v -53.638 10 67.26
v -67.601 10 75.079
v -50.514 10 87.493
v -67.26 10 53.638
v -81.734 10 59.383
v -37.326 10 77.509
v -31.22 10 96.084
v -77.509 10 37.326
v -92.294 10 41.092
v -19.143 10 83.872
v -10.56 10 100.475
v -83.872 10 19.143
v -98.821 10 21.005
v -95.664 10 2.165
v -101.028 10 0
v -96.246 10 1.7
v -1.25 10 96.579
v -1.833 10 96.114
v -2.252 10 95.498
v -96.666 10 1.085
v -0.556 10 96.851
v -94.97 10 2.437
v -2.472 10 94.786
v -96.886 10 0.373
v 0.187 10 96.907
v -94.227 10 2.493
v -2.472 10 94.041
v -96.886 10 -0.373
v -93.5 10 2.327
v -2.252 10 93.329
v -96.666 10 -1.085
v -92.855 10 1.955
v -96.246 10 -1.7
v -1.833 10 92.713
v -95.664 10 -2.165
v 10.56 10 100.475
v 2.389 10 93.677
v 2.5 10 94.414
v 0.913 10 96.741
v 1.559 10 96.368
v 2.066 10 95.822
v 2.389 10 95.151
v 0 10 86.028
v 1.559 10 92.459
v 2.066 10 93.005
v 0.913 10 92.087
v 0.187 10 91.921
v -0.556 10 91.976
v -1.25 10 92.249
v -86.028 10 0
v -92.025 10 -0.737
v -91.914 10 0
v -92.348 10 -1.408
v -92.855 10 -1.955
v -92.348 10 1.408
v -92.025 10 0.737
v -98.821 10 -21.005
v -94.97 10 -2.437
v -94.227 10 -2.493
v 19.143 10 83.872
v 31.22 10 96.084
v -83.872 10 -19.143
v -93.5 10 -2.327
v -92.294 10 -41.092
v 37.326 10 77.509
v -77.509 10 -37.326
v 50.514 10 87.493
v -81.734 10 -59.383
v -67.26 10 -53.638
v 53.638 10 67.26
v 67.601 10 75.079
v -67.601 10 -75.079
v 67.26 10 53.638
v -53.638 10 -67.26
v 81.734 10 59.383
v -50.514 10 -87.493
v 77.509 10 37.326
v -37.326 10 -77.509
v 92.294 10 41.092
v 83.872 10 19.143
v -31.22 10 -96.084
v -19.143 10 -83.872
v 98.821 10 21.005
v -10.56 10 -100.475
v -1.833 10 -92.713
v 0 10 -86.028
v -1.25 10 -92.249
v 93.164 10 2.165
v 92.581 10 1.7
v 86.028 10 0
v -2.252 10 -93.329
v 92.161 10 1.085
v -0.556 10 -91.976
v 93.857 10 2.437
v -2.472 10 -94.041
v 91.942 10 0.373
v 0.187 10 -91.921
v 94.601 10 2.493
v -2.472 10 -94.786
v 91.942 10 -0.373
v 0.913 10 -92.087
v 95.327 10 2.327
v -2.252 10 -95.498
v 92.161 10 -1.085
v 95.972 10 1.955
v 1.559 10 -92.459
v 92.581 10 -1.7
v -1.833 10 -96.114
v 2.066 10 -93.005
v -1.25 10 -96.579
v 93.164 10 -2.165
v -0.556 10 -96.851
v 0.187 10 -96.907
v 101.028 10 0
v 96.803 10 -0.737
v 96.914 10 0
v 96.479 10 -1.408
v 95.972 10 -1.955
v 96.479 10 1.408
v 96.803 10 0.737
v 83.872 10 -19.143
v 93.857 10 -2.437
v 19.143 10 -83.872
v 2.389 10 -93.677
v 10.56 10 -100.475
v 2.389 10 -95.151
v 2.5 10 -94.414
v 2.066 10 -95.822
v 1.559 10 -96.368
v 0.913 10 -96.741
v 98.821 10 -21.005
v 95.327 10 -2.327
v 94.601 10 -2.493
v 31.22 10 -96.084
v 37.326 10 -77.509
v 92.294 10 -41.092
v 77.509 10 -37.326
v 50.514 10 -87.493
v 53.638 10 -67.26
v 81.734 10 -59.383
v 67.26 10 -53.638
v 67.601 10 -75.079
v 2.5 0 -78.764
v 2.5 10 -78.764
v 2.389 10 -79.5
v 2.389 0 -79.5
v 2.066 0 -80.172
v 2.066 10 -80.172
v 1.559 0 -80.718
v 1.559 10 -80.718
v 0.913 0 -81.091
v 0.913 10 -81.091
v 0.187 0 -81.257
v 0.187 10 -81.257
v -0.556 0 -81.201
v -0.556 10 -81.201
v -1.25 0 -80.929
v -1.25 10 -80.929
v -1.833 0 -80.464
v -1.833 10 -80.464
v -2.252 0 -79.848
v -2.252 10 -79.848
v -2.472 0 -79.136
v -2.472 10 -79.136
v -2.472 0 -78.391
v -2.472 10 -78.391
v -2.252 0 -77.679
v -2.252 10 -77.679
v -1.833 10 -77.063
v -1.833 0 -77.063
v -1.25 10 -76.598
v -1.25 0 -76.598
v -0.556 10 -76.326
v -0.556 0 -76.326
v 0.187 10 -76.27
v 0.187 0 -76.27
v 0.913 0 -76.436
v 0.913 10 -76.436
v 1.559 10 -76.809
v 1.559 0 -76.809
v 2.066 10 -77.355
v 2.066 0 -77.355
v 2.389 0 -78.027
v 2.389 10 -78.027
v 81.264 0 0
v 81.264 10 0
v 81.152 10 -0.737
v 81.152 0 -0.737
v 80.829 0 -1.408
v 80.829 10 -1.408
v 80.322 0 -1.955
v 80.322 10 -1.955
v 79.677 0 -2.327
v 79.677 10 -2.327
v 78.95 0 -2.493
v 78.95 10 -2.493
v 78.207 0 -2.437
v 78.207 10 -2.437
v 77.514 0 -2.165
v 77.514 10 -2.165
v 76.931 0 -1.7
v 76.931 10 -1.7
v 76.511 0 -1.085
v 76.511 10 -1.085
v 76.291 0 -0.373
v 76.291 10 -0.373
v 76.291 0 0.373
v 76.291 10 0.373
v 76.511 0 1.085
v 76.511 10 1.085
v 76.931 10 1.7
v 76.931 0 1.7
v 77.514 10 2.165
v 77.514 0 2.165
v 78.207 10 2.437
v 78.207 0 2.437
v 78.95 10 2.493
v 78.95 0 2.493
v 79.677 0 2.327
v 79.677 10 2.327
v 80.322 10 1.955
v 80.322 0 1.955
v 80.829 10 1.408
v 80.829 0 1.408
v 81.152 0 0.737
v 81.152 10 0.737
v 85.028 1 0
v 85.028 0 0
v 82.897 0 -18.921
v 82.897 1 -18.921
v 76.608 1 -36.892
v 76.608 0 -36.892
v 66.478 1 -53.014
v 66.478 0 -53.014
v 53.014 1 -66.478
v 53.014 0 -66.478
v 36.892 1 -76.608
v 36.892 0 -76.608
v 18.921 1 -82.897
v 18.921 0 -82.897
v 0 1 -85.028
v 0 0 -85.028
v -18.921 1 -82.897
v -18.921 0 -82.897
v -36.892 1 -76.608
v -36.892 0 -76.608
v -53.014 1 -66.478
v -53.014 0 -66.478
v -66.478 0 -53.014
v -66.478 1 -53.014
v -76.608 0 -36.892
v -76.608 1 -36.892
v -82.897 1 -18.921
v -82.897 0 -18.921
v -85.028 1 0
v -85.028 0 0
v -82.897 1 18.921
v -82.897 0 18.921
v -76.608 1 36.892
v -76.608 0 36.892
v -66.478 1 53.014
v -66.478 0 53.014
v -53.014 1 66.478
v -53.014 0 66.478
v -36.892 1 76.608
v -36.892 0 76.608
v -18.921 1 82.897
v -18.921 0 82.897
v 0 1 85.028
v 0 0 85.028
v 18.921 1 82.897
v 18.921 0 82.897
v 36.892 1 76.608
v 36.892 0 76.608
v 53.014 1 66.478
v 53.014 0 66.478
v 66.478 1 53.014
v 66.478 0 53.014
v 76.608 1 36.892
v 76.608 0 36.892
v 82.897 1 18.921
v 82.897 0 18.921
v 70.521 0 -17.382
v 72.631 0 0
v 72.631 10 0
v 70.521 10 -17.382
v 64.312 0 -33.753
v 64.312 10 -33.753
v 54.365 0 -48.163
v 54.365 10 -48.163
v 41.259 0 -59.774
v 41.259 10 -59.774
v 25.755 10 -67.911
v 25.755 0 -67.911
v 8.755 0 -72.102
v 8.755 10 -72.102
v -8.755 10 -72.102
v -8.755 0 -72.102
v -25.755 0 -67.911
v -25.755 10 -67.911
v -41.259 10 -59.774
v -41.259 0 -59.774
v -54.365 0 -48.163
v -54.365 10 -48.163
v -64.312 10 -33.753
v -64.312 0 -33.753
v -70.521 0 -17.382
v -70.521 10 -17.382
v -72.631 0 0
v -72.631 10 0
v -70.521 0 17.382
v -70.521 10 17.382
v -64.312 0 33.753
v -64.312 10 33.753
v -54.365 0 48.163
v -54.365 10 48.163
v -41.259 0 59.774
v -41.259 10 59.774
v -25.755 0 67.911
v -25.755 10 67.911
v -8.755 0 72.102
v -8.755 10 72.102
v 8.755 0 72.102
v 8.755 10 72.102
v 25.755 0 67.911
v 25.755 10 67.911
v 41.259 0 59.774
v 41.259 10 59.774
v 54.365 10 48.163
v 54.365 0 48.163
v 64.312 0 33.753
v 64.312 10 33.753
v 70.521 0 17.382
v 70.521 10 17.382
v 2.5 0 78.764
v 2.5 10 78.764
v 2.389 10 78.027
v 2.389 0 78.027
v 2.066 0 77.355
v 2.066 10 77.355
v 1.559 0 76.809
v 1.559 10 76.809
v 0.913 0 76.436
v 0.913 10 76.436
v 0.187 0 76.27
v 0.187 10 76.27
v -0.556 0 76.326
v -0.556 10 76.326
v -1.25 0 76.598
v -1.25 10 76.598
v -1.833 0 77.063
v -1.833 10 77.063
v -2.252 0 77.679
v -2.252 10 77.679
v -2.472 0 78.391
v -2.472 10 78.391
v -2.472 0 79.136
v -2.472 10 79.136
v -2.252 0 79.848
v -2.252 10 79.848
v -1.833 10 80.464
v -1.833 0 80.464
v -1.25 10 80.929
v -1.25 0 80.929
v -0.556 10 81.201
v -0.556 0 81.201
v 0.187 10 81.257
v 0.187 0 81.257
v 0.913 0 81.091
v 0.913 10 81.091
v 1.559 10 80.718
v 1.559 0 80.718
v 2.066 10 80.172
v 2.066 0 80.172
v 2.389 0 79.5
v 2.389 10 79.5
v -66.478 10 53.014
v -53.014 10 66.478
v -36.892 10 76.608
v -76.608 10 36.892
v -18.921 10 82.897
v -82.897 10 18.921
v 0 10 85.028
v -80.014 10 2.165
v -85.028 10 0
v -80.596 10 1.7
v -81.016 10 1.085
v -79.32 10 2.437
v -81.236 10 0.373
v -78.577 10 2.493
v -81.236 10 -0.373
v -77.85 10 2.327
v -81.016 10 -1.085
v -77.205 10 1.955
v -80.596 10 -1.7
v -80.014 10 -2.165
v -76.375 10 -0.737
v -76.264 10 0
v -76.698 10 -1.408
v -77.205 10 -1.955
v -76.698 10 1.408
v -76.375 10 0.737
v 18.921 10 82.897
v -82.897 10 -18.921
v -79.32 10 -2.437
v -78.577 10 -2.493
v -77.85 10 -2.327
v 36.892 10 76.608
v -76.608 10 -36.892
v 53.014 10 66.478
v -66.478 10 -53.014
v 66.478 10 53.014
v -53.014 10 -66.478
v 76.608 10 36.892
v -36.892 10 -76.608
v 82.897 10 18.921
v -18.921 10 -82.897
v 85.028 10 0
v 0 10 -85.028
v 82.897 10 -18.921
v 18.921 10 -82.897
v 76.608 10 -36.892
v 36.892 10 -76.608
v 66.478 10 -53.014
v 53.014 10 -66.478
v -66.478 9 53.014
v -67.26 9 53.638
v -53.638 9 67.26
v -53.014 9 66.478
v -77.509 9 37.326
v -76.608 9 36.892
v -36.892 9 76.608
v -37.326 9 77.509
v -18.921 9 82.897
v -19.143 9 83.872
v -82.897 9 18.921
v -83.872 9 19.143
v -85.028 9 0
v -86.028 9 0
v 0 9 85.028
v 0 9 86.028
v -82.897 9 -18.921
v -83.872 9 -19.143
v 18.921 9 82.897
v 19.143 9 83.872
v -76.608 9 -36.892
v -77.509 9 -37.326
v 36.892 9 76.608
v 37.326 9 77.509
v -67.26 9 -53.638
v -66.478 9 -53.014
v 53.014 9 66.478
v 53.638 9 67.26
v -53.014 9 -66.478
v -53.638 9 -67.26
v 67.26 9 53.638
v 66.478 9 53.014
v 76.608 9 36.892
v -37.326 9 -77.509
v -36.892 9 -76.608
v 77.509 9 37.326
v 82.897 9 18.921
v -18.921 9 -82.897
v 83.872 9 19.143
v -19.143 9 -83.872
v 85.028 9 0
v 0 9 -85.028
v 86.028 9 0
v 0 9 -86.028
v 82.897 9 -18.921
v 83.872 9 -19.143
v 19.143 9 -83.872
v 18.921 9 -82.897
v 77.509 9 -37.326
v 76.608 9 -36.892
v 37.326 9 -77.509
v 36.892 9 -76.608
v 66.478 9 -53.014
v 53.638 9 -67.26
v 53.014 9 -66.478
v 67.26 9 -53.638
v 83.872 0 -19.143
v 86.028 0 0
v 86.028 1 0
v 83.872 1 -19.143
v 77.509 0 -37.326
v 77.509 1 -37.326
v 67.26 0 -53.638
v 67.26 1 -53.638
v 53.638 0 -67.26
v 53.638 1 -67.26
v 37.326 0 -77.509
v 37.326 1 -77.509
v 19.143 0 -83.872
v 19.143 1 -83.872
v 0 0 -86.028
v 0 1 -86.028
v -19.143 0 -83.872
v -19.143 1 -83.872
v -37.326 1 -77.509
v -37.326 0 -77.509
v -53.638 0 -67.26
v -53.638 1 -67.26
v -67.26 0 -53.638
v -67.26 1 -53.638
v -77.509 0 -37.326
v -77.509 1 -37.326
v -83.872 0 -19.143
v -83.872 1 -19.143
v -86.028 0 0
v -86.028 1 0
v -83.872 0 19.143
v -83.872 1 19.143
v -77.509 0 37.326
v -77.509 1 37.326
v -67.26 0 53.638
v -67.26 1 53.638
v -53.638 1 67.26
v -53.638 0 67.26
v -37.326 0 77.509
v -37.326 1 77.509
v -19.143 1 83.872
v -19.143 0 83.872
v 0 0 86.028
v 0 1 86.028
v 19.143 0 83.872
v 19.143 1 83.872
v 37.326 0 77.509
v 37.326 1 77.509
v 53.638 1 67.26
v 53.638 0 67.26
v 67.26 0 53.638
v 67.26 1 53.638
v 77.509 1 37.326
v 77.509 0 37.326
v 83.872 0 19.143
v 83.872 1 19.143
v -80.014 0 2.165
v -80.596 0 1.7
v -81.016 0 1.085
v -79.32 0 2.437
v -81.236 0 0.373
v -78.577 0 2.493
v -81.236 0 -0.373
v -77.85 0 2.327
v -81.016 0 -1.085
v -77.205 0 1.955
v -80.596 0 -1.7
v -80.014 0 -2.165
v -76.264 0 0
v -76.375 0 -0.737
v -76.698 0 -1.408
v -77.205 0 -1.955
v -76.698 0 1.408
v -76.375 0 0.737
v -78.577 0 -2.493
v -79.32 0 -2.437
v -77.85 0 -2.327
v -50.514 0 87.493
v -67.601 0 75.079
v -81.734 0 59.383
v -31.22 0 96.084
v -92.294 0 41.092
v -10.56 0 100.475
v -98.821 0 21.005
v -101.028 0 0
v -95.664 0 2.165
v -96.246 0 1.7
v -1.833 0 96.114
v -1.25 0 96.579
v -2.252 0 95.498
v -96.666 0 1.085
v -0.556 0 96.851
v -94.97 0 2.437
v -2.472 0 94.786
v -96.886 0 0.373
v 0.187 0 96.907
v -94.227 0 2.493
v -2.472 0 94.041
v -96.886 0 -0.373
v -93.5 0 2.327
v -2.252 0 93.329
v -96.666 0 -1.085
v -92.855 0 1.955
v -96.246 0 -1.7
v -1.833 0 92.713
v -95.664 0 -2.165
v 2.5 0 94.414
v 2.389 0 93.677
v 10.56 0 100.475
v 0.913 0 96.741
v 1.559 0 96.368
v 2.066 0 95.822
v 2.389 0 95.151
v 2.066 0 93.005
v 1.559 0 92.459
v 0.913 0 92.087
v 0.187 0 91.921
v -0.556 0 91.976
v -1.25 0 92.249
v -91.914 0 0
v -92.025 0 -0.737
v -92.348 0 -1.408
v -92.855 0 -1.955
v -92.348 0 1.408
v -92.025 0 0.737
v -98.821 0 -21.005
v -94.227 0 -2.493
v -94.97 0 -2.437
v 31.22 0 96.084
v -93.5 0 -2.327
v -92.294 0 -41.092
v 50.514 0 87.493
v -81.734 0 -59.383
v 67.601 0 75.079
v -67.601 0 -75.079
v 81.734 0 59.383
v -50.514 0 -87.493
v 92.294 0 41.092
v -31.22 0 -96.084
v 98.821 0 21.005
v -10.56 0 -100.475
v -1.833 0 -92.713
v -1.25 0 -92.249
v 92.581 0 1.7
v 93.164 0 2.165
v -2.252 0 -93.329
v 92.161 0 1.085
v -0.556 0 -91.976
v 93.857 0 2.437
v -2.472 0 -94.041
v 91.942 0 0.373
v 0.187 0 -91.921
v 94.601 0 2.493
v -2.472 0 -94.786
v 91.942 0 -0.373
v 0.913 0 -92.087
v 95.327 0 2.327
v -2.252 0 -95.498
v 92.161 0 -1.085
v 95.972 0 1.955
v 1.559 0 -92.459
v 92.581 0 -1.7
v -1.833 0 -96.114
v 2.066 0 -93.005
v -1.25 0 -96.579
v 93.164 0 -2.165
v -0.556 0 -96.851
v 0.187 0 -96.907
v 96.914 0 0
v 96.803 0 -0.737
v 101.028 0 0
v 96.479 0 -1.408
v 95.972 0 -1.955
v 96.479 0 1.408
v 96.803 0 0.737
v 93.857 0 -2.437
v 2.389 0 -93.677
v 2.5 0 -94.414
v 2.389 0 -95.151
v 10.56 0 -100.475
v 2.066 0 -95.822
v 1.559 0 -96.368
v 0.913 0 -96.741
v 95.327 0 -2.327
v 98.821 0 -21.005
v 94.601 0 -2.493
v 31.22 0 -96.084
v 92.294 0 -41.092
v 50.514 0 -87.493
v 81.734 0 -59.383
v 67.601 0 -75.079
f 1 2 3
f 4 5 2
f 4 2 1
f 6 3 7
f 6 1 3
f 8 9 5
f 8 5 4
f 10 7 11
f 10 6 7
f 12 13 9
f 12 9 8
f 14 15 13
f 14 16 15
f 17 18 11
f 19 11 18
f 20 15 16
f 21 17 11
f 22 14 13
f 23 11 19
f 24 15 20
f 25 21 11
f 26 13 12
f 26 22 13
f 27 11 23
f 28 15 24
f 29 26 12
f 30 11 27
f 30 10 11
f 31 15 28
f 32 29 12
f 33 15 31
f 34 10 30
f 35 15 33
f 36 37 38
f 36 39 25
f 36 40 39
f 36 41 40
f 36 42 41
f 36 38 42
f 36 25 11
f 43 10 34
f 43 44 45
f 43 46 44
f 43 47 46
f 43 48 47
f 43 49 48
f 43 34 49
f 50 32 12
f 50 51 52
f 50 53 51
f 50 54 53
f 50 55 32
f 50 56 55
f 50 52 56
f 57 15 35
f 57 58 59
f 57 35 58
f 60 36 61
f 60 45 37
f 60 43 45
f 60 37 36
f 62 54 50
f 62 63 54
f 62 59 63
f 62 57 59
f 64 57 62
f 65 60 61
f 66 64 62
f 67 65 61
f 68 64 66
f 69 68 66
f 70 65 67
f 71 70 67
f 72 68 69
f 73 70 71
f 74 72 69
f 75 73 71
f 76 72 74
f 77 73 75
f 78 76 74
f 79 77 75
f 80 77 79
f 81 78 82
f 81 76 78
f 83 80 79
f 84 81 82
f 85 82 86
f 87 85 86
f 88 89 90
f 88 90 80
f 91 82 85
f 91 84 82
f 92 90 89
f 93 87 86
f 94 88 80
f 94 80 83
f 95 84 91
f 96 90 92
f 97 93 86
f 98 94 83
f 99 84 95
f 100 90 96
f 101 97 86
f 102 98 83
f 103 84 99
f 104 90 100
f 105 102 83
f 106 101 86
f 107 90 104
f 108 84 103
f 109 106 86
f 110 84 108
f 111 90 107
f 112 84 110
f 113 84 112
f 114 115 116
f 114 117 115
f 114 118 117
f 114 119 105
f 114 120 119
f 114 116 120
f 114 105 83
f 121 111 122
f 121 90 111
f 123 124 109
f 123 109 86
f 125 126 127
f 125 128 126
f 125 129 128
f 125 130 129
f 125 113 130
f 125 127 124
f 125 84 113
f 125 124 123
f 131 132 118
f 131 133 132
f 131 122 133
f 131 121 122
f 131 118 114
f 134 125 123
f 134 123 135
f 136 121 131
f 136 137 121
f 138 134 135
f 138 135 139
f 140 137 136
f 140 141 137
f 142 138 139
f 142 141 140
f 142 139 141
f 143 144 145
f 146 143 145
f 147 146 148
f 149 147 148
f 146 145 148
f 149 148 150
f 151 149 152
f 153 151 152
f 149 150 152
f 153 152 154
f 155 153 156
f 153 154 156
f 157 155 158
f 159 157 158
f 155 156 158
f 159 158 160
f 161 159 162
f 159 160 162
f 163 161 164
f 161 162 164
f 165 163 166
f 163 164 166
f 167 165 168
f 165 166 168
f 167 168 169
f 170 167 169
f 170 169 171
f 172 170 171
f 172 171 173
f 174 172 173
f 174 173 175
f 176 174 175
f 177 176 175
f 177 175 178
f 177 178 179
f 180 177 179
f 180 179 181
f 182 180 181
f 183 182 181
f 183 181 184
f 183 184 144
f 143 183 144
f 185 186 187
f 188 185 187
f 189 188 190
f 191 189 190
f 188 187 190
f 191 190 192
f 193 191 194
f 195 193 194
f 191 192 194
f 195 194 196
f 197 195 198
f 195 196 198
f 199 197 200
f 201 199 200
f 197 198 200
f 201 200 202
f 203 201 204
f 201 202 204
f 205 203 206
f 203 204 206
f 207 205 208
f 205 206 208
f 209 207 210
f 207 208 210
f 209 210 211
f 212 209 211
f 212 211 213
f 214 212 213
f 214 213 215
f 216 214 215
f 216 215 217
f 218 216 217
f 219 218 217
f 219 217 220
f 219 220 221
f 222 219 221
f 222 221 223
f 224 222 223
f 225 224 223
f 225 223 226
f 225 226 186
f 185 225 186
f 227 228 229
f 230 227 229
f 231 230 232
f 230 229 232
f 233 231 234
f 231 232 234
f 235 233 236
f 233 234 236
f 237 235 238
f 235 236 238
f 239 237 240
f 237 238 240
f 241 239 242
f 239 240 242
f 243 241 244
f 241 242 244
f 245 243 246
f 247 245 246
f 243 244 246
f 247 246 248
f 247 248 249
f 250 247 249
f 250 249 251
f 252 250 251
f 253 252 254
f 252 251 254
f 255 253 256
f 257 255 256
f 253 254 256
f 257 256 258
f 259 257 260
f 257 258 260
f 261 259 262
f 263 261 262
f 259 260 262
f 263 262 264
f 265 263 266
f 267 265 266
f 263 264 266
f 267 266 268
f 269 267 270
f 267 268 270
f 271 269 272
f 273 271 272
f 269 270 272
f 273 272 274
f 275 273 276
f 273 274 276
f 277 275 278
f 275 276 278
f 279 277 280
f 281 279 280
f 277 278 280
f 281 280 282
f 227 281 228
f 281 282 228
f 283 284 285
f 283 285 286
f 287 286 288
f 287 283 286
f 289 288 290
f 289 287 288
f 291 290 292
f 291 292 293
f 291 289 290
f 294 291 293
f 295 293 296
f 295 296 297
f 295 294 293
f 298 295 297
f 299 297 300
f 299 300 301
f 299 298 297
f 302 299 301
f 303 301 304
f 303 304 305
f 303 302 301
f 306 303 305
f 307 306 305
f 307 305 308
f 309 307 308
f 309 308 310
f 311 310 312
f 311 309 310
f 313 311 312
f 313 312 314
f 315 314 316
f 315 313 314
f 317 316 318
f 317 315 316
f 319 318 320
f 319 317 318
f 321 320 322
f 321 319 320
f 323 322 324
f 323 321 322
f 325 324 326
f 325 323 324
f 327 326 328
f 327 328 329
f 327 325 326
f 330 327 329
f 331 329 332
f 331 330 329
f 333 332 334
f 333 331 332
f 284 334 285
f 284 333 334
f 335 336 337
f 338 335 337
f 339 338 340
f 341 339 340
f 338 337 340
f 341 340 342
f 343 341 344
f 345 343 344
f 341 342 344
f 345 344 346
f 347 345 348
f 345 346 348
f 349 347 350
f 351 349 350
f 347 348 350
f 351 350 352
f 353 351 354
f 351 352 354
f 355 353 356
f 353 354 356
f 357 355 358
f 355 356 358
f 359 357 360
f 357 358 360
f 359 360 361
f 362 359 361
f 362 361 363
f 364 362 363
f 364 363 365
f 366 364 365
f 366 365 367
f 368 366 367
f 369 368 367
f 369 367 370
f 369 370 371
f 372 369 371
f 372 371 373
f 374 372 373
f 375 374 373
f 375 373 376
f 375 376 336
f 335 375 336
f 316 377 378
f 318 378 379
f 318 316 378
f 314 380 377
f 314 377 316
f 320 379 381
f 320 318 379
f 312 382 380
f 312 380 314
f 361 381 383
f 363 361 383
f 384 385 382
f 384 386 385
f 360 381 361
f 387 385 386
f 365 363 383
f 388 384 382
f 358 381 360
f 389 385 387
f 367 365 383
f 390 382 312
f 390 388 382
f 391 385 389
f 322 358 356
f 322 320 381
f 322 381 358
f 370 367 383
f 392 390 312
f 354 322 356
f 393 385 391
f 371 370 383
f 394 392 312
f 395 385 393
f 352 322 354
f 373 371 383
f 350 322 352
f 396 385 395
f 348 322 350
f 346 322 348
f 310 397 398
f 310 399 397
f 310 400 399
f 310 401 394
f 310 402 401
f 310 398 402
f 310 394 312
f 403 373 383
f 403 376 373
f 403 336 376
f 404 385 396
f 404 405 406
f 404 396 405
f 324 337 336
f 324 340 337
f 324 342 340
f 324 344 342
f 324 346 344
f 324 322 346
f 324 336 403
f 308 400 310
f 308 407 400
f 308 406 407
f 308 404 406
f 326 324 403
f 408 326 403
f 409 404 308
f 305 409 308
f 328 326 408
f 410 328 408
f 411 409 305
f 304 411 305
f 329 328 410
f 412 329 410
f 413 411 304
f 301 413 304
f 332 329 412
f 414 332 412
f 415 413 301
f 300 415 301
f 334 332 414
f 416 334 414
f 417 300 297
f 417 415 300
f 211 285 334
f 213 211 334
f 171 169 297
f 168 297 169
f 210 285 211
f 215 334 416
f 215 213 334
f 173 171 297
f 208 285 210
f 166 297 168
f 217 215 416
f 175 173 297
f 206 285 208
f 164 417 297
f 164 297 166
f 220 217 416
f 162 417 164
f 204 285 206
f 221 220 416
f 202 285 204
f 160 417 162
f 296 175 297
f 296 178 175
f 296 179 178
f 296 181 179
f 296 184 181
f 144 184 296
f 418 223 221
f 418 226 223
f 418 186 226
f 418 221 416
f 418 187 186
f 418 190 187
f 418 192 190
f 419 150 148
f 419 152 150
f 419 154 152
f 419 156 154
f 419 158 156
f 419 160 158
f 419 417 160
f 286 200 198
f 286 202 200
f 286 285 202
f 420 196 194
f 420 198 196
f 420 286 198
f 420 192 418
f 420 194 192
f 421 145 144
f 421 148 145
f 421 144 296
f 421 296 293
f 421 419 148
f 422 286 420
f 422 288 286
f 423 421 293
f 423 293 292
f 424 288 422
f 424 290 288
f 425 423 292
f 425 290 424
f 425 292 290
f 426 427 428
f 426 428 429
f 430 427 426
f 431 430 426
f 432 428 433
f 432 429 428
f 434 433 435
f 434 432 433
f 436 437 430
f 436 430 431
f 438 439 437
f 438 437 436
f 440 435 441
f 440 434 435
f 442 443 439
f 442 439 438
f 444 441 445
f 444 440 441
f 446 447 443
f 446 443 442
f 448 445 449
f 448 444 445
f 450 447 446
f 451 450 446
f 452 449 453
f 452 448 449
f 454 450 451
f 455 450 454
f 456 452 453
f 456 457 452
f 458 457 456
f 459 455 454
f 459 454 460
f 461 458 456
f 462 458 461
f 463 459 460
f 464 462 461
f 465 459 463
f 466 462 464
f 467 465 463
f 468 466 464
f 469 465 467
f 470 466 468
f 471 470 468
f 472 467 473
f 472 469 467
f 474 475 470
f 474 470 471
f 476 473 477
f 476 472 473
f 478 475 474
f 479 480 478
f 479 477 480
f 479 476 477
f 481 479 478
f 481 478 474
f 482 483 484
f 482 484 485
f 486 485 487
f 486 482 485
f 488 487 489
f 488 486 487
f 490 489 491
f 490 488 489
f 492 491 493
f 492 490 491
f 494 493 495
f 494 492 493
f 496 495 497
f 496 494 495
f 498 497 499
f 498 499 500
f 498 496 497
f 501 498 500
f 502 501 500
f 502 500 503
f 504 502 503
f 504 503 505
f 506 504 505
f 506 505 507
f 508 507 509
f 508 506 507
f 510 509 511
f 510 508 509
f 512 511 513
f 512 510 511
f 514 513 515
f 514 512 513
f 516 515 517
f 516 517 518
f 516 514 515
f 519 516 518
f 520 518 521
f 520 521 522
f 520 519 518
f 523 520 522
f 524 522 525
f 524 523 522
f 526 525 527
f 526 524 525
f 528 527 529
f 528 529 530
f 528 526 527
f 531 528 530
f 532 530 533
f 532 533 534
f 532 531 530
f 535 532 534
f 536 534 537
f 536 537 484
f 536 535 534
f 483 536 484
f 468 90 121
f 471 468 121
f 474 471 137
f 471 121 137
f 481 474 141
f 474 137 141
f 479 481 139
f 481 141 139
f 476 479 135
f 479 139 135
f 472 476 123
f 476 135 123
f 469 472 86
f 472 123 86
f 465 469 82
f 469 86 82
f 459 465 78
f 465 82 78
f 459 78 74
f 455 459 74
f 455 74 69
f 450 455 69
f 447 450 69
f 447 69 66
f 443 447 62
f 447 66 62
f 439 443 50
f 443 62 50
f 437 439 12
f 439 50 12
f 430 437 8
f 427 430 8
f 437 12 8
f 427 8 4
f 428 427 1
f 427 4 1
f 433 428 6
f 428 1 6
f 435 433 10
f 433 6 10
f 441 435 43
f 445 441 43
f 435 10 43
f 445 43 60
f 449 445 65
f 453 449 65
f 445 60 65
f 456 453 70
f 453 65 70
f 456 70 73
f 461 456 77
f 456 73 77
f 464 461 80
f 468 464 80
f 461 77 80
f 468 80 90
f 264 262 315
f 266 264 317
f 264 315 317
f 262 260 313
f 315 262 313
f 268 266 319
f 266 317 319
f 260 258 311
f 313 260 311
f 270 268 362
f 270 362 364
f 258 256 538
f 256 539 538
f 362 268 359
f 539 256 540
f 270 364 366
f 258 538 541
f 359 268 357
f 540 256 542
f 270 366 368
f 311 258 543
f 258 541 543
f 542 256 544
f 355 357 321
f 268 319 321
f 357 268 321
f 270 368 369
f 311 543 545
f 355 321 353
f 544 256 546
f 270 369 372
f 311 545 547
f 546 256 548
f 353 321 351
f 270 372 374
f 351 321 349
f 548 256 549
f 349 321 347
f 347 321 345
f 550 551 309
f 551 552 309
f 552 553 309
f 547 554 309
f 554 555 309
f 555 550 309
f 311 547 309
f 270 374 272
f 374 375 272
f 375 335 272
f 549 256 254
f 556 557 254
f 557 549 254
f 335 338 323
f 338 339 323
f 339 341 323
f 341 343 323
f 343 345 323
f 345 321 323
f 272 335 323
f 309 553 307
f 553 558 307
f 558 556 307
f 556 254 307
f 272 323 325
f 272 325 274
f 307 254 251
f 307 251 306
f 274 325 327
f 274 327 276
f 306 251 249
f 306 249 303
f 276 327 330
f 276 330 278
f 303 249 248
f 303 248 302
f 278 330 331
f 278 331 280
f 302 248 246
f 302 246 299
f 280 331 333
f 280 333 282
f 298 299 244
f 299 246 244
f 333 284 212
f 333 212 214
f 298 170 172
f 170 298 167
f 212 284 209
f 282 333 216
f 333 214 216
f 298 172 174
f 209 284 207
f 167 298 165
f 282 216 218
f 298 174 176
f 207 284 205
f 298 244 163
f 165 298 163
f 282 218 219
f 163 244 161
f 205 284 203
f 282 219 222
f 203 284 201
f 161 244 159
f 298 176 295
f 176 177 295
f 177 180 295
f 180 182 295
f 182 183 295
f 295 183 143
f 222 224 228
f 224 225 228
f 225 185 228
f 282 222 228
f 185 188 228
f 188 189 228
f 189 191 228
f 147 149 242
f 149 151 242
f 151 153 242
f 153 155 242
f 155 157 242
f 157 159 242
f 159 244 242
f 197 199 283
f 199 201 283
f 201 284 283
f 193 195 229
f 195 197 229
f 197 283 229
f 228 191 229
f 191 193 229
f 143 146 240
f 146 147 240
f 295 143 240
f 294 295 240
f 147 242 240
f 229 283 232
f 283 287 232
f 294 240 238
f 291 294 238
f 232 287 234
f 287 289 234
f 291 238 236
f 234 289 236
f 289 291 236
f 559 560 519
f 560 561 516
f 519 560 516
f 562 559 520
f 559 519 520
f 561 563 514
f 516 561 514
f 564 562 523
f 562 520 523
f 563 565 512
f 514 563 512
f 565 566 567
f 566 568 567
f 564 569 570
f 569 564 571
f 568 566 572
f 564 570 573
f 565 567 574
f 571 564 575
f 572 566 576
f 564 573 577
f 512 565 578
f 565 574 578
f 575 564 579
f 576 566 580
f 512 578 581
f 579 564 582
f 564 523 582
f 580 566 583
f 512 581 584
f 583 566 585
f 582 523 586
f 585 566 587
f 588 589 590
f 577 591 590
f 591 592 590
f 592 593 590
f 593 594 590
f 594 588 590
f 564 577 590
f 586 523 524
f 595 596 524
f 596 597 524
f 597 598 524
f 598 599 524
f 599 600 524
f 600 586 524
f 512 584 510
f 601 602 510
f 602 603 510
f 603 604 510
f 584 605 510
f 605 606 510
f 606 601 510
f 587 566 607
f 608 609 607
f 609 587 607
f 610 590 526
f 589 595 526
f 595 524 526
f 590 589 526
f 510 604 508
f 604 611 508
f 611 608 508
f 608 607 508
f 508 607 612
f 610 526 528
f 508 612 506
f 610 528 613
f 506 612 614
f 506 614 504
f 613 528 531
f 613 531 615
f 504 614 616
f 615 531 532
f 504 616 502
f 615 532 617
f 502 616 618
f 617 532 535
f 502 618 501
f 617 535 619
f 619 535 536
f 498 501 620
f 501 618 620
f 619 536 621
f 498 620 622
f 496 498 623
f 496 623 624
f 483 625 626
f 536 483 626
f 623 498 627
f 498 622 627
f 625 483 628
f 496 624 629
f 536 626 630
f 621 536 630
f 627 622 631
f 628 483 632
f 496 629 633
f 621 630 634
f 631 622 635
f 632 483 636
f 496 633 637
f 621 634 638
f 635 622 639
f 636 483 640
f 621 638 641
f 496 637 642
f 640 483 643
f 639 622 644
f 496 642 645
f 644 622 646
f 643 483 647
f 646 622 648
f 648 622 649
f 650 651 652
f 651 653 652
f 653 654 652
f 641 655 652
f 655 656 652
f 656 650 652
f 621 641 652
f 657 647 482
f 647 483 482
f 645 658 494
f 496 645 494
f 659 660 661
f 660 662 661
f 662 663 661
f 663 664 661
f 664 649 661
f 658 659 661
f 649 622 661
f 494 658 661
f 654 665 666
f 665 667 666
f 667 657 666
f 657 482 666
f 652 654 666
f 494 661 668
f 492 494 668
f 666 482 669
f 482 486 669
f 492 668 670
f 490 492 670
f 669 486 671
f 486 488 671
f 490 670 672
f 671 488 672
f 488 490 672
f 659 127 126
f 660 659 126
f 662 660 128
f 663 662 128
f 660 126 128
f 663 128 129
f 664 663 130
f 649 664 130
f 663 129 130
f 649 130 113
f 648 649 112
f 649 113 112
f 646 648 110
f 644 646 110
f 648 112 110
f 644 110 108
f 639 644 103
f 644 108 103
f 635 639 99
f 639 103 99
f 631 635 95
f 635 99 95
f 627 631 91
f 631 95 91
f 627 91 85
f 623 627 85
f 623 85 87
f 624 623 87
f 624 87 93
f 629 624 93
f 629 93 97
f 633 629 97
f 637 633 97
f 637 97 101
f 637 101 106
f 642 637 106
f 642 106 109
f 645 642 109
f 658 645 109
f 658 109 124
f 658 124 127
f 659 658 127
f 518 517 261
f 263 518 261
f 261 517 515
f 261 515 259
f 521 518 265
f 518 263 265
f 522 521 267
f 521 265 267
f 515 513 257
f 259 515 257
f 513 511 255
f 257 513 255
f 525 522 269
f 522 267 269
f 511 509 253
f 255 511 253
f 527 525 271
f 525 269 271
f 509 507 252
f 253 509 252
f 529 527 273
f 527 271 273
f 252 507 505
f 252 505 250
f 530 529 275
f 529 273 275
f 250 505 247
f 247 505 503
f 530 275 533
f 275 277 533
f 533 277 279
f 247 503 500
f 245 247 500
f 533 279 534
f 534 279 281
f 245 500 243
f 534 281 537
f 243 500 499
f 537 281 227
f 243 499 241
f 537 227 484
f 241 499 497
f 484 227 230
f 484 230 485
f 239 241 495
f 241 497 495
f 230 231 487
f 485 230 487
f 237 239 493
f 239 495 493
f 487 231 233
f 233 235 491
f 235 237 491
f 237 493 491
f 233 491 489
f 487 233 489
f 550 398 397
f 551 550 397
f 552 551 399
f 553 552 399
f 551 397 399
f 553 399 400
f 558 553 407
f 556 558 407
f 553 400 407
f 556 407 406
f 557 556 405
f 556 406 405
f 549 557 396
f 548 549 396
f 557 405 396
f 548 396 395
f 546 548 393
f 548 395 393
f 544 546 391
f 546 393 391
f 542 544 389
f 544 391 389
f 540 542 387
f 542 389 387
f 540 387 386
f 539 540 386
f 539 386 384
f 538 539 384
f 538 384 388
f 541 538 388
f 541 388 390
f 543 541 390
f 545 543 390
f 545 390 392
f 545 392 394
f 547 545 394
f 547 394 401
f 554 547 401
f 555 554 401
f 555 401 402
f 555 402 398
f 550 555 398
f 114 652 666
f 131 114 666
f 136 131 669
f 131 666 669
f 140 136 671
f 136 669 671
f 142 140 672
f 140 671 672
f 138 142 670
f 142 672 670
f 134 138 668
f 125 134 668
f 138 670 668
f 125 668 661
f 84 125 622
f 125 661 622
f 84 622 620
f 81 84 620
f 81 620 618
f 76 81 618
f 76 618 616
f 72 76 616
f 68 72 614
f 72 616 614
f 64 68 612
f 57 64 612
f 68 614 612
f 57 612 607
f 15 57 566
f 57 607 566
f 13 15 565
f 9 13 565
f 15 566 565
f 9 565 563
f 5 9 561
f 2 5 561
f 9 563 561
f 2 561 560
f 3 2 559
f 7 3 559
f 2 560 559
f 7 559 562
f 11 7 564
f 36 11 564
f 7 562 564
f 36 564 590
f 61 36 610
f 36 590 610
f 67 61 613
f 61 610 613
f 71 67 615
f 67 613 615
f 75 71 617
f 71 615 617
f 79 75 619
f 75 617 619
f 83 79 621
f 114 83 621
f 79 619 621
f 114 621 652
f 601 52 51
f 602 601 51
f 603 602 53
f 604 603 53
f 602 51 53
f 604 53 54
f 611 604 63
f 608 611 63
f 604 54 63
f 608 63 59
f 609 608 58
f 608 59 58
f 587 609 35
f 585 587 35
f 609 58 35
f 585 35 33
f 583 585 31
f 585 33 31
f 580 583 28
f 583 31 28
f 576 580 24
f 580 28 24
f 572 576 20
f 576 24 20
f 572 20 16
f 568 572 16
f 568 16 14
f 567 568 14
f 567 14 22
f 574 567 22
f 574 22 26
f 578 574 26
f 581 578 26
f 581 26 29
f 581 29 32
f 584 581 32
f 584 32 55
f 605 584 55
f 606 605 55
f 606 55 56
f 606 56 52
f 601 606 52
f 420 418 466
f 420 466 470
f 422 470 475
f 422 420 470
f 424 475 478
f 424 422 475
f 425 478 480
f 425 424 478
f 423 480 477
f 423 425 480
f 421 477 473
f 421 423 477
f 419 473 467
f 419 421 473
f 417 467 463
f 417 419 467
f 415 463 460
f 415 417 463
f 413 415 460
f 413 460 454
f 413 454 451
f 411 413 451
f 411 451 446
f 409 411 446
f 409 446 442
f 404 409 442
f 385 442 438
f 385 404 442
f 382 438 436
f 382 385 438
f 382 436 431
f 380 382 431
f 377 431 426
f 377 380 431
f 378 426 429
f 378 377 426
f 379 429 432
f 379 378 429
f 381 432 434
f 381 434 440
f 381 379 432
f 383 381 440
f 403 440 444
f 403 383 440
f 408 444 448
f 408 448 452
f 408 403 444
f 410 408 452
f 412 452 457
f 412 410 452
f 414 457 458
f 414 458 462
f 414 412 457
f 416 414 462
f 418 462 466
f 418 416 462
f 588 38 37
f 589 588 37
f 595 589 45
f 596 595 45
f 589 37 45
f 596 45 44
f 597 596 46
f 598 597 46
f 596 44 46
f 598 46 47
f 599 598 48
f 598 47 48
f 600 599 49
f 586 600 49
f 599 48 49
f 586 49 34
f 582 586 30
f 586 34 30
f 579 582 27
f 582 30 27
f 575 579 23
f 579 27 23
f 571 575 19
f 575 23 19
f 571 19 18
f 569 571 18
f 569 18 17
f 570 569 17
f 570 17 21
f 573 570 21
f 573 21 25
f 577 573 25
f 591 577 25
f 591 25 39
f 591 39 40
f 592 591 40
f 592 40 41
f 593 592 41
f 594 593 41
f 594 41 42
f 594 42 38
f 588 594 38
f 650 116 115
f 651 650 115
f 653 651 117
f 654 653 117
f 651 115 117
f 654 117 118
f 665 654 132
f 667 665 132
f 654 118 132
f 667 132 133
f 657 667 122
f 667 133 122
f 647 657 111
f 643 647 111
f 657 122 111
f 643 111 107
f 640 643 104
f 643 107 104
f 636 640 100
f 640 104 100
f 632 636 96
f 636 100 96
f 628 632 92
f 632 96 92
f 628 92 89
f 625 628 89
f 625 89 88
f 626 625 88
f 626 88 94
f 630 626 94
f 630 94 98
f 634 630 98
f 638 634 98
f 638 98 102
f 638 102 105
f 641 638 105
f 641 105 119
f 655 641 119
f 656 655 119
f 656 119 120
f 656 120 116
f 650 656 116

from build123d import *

# Parameters (mm, degrees)
SKETCH1_R           = 101.0285
SKETCH1_R_2         = 72.6313
BOSS_EXTRUDE1_DEPTH = 10
SKETCH2_R           = 2.5
CUT_EXTRUDE1_DEPTH  = 11
SKETCH3_R           = 86.0285
SKETCH3_R_2         = 85.0285
CUT_EXTRUDE2_DEPTH  = 1


with BuildPart() as part:
    # Sketch1 → Boss-Extrude1 (new body)
    with BuildSketch(Plane(origin=(0, 0, 0), x_dir=(1, 0, 0), z_dir=(0, 1, 0))):
        Circle(SKETCH1_R)
        Circle(SKETCH1_R_2, mode=Mode.SUBTRACT)
    extrude(amount=BOSS_EXTRUDE1_DEPTH)

    # Sketch2 → Cut-Extrude1 (cut, through all)
    with BuildSketch(Plane(origin=(0, 10, 0), x_dir=(1, 0, 0), z_dir=(0, 1, 0))):
        with Locations((-94.4137, 0)):
            Circle(SKETCH2_R)
        with Locations((-78.7635, 0)):
            Circle(SKETCH2_R)
        with Locations((0, 78.7635)):
            Circle(SKETCH2_R)
        with Locations((0, 94.4137)):
            Circle(SKETCH2_R)
        with Locations((78.7635, 0)):
            Circle(SKETCH2_R)
        with Locations((94.4137, 0)):
            Circle(SKETCH2_R)
        with Locations((0, -78.7635)):
            Circle(SKETCH2_R)
        with Locations((0, -94.4137)):
            Circle(SKETCH2_R)
    extrude(amount=-CUT_EXTRUDE1_DEPTH, mode=Mode.SUBTRACT)

    # Sketch3 → Cut-Extrude2 (cut)
    with BuildSketch(Plane(origin=(0, 10, 0), x_dir=(1, 0, 0), z_dir=(0, 1, 0))):
        Circle(SKETCH3_R)
        Circle(SKETCH3_R_2, mode=Mode.SUBTRACT)
    cut_extrude2 = extrude(amount=-CUT_EXTRUDE2_DEPTH, mode=Mode.SUBTRACT)

    # Mirror1: Cut-Extrude2 across plane
    add(cut_extrude2.mirror(Plane.ZX.offset(5)), mode=Mode.SUBTRACT)


solid = part.part
